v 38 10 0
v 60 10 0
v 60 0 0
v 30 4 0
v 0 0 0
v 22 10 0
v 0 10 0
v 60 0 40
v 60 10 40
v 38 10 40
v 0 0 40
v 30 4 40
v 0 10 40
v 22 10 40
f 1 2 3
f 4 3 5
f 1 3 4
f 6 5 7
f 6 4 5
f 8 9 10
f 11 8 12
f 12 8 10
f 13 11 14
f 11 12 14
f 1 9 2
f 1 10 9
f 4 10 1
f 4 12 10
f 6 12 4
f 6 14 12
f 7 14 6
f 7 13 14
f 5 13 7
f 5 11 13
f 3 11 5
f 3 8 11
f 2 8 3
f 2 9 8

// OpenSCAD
$fn = 32;

// ----------------------------------------------------------------------
// V guide rail: vway, 60 mm wide
// ----------------------------------------------------------------------

// --- parameters (mm) ---
rail_w = 60;              // rail width, X
base_t = 10;              // base plate thickness
v_depth = 6;              // V feature depth / height
v_half_w = 8;             // half width of the V at the base face
plate_t = 40;             // rail length, Z (the extrusion height)

profile = [[0, 0], [60, 0], [60, 10], [38, 10], [30, 4], [22, 10], [0, 10]];  // primary outline, 7 points, counter clockwise

// --- the one profile operation ---
linear_extrude(height = plate_t) polygon(points = profile);
